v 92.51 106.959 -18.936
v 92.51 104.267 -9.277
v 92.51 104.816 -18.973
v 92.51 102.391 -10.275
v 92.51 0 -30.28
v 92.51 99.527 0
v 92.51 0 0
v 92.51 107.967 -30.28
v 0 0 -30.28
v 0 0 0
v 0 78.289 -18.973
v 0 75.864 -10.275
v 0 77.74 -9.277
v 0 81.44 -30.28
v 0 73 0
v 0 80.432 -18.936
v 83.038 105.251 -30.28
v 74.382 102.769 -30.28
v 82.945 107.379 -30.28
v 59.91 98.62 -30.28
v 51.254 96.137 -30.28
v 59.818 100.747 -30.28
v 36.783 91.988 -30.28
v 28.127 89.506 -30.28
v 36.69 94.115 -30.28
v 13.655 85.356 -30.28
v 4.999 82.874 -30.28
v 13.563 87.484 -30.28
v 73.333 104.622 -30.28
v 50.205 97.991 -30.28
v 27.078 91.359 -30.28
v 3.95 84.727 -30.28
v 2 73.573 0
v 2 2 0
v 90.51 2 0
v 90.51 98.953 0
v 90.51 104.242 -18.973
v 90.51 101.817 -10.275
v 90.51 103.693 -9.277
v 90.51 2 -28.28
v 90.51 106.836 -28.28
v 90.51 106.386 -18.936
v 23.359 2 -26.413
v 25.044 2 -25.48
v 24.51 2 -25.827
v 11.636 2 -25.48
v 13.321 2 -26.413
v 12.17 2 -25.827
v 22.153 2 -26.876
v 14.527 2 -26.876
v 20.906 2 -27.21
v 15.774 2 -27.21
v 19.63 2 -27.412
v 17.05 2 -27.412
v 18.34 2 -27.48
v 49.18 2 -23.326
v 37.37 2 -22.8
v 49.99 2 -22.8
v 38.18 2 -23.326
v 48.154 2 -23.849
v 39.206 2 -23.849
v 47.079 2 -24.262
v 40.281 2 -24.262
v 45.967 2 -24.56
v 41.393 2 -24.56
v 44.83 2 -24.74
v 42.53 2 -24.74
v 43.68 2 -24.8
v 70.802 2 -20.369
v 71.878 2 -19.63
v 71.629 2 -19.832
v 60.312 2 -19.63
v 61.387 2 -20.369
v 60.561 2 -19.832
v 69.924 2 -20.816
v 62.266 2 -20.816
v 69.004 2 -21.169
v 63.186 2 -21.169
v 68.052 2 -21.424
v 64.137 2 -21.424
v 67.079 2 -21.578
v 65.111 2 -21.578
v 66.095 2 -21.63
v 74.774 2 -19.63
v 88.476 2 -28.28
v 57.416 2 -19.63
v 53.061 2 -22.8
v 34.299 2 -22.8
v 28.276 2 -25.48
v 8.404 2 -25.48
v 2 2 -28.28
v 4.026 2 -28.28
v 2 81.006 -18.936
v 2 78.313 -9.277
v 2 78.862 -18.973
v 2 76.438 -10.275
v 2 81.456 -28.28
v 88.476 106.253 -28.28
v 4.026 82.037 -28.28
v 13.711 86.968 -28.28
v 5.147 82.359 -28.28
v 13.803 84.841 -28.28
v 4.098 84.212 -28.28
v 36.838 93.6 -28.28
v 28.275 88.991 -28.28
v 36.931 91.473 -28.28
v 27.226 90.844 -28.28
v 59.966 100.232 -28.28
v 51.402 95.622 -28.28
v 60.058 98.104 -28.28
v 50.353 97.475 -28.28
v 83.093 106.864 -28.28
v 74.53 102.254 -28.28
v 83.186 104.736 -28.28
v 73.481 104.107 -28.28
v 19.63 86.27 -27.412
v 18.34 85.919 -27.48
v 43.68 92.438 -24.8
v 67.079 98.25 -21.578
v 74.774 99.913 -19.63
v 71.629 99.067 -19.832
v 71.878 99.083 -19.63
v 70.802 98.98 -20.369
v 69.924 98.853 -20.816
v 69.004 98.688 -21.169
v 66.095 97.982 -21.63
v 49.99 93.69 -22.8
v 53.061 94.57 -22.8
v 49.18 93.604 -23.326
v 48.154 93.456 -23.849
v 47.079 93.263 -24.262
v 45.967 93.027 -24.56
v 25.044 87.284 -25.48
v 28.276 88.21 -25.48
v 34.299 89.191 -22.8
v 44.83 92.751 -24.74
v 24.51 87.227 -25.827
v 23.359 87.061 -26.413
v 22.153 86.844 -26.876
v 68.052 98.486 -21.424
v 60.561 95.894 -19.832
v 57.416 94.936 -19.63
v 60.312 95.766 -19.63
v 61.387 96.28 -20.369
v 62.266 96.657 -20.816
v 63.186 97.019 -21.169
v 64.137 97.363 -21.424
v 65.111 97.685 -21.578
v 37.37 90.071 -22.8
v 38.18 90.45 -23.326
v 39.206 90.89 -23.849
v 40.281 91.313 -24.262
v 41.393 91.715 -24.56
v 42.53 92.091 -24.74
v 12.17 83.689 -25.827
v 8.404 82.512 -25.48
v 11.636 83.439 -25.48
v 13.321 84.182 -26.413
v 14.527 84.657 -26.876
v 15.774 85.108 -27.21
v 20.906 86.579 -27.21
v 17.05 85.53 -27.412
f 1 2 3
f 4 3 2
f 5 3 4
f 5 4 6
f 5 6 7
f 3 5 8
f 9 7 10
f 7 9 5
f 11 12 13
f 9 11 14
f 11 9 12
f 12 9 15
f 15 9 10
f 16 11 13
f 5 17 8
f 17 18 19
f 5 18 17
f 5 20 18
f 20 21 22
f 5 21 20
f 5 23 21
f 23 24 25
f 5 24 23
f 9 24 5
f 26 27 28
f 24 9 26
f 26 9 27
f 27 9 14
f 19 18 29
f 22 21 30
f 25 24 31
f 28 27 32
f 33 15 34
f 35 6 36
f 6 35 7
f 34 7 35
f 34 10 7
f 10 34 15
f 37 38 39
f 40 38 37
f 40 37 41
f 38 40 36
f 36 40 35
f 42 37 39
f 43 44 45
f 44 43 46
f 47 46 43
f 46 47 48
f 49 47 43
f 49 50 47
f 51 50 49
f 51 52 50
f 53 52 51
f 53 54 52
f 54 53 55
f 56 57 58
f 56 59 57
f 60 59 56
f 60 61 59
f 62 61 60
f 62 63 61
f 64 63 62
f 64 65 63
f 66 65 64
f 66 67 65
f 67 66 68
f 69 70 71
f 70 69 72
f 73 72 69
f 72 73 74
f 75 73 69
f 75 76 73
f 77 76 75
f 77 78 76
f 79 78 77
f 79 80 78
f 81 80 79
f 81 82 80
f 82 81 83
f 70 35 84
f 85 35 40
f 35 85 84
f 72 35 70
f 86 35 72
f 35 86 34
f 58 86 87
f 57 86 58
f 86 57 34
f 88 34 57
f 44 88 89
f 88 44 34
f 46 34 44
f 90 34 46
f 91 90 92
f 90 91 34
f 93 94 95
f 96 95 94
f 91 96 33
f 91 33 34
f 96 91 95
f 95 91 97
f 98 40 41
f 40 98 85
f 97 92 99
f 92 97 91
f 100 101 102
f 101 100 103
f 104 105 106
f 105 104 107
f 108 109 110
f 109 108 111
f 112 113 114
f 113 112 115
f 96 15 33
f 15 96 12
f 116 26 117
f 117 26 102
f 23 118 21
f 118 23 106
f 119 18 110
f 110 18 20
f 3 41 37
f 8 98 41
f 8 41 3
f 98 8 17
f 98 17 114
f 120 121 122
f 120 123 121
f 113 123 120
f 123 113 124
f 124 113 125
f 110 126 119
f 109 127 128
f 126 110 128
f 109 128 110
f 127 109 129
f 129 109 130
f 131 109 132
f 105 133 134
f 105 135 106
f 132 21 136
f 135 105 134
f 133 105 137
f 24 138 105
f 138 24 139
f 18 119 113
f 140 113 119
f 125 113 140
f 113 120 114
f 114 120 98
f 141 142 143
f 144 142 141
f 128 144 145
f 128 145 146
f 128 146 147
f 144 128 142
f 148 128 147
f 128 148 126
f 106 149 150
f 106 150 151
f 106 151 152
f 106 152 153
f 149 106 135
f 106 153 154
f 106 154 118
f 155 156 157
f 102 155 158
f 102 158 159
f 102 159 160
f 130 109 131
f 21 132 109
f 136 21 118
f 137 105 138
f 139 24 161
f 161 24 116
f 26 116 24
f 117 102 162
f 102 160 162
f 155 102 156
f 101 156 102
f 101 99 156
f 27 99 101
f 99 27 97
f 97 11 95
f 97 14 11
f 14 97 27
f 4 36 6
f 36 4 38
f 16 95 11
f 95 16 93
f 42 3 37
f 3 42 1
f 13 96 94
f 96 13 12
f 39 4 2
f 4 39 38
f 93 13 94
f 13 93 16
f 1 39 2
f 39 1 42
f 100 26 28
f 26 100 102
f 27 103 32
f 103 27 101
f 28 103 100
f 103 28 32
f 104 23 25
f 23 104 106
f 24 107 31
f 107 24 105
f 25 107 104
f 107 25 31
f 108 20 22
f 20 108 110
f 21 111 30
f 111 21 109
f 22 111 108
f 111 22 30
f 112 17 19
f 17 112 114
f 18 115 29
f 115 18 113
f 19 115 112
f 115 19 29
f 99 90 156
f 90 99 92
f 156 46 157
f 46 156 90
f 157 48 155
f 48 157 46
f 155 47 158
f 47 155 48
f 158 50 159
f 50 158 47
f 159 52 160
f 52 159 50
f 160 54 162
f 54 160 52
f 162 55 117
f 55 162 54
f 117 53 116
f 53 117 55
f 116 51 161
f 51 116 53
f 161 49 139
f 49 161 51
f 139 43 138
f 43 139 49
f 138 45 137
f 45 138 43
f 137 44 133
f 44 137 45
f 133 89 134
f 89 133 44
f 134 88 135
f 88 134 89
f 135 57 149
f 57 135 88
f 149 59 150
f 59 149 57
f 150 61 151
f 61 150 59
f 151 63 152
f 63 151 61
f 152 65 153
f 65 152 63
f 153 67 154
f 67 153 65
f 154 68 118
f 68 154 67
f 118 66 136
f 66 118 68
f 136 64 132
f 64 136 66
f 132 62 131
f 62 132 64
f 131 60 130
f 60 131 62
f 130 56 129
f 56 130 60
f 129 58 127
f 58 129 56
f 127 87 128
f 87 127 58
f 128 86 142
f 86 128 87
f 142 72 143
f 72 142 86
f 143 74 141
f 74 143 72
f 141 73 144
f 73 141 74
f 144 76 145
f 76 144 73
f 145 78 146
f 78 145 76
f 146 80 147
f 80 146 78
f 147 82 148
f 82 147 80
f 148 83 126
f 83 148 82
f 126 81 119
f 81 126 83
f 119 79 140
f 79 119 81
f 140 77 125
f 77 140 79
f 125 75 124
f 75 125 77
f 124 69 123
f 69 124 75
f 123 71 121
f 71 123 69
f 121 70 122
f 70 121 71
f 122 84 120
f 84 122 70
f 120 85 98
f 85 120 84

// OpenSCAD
/* [General] */

// Choose a currency you use.
currency = "other"; // [usd:USD - US dollar, eur:EUR - Euro, chf:CHF - Swiss franc, cad:CAD - Canadian dollar, thb:THB - Thai Baht, other:Other (See "Slot customization" tab above)]

// How tall is the the shortest tube? In millimeters:
height = 73; // [10:150]

// Choose a pattern for the back side.
pattern = "no"; // [no:Solid without pattern, chncoin:Chinese ancient coin pattern, mesh:Mesh pattern]

// Would you like Tom-and-Jerry pictures on the left side and right side? (Not fully supported; may only work with OpenSCAD version 2014.09 ~ 2014.12.)
image = 0; //// [1:Yes please, 0:No thanks]

// Which one would you like to see?
part = "basebox"; // [all:All these three parts assembled together,all_unassembled:All these three parts unassembled,basebox:Base box only,topboard:Top board only,tubes:Tubes only]

/* [Slot customization] */

// In this tab you're able to customize your coins. Here below, you may have up to 10 slots, each for one kind of coin. For each slot you're going to define it's diameter and thickness. Note that the coins should be ordered from biggest to smallest in diameter. You may want to collect information about the diameters and thicknesses of your coins from wikipedia before you continue.
understand = 1; // [1:Yes I understand,0:Yes I said understand]

// in millimeters. For the first (and biggest) coin.
coin_1_diameter = 23.88;
// in millimeters.
coin_1_thickness = 1.58;
// The second coin. Remember: this 2nd coin should always be smaller than the 1st coin.
coin_2_diameter = 21.20;
coin_2_thickness = 1.76;
// The 3rd coin.
coin_3_diameter = 18.03;
coin_3_thickness = 1.22;
// 4th coin.
coin_4_diameter = 0;
coin_4_thickness = 0;
// 5th coin. If you don't need more coins, simply set the remaining to 0.
coin_5_diameter = 0;
coin_5_thickness = 0;
// 6th coin.
coin_6_diameter = 0;
coin_6_thickness = 0;
// 7th coin.
coin_7_diameter = 0;
coin_7_thickness = 0;
// 8th coin.
coin_8_diameter = 0;
coin_8_thickness = 0;
// 9th coin.
coin_9_diameter = 0;
coin_9_thickness = 0;
// 10th coin.
coin_10_diameter = 0;
coin_10_thickness = 0;

/* [Hidden] */

usd_coins = [[30.61, 26.50, 24.26, 21.21, 19.05, 17.91],
             [ 2.15,  2.00,  1.75,  1.95,  1.55,  1.35]];
eur_coins = [[25.75, 24.25, 23.25, 22.25, 21.25, 19.75, 18.75, 16.25],
             [ 2.20,  2.38,  2.33,  2.14,  1.67,  1.93,  1.67,  1.67]];
chf_coins = [[31.45, 27.40, 23.20, 21.05, 19.15, 18.20, 17.15],
             [ 2.35,  2.15,  1.15,  1.65,  1.45,  1.25,  1.25]];
cad_coins = [[28.00, 27.13, 26.50, 23.88, 21.20, 19.05, 18.03],
             [ 1.80,  1.95,  1.75,  1.58,  1.76,  1.45,  1.22]];
thb_coins = [[26.00, 24.05, 22.05, 20.01],
             [ 2.16,  2.13,  1.48,  1.38]];

other_coins_d_t = [
  [coin_1_diameter, coin_1_thickness], [coin_2_diameter, coin_2_thickness],
  [coin_3_diameter, coin_3_thickness], [coin_4_diameter, coin_4_thickness],
  [coin_5_diameter, coin_5_thickness], [coin_6_diameter, coin_6_thickness],
  [coin_7_diameter, coin_7_thickness], [coin_8_diameter, coin_8_thickness],
  [coin_9_diameter, coin_9_thickness], [coin_10_diameter, coin_10_thickness]];

other_coins = [[for (i=other_coins_d_t) if(i[0] > 0) i[0]],
               [for (i=other_coins_d_t) if(i[0] > 0) i[1]]];


//  .88b  d88.   .d8b.   d888888b  d8b   db
//  88'YbdP`88  d8' `8b    `88'    888o  88
//  88  88  88  88ooo88     88     88V8o 88
//  88  88  88  88~~~88     88     88 V8o88
//  88  88  88  88   88    .88.    88  V888
//  YP  YP  YP  YP   YP  Y888888P  VP   V8P

coins = currency == "usd" ? usd_coins :
        currency == "eur" ? eur_coins :
        currency == "chf" ? chf_coins :
        currency == "cad" ? cad_coins :
        currency == "thb" ? thb_coins : other_coins;

coins_d = coins[0];
coins_thickness = coins[1];

enable_box = (part == "all" || part == "all_unassembled" || part == "basebox");
  enable_dovetail = true;
  enable_box_emptier = false;
  enable_mesh = (pattern != "no");
  enable_image = (image == 1);
enable_top_board = (part == "all" || part == "all_unassembled" || part == "topboard");
enable_tubes = (part == "all" || part == "all_unassembled" || part == "tubes");
  enable_tube_scale = true;
  enable_tube_emptier = false;
  inspect_tube_inside = false;
assembled = (part != "all_unassembled");
lay_flat = (part != "all" && part != "all_unassembled");

sorter_min_height = height;
board_thickness = 2.0;
board_left_padding = 2;
board_right_padding = 13;
board_primary_slope = 16;
board_secondary_slope = 15;
horizontal_guard_width = 3;
coin_padding = 0.4;
coin_padding_top_board = 0.25;
nozzle_size = 0.4;
nozzle_size_upbound = 0.41;

dovetail_count = 4;
dovetail_back_max_width = 10;
dovetail_back_min_width = 9;
dovetail_side_max_width = 10;
dovetail_side_min_width = 9;
dovetail_femail_margin = 0.5;

image_left_size = 25;
image_right_size = 30;
image_dir = "";

tubes_shorter = 5;
tubes_front_back_cut = 2;
tubes_base_thickness = 4.0;
tubes_back_thinner = 1;
tubes_scale_depth = 0.4;
tubes_scale_height = 0.8;

unassembled_top_board_lift = 25;
unassembled_tubes_lift = 20;

$fa = 6;  // default: 12
$fs = 1;  // default: 2

coin_count = len(coins_d);
coin_max_index = coin_count - 1;

board_length = (board_left_padding + board_right_padding
                + sum_coins_d()
                + coin_padding * coin_count * 2
                + board_thickness * (coin_count + 3));

board_width = coins_d[0] + coin_padding + board_thickness * 3;

slope_height = tan(board_secondary_slope) * board_width
               + tan(board_primary_slope) * board_length;

sorter_max_height = sorter_min_height + slope_height + board_thickness;
echo("board_length:", board_length);
echo("board_width:", board_width);
echo("sorter_min_height:", sorter_min_height);
echo("sorter_max_height:", sorter_max_height);

main();

module main() {
  top_board_lift = assembled ? 0 : unassembled_top_board_lift;
  tubes_lift = assembled ? 0 : unassembled_tubes_lift;
  if (lay_flat) {
    main_impl_flat(top_board_lift, tubes_lift);
  } else {
    main_impl(top_board_lift, tubes_lift);
  }
}
module main_impl(top_board_lift=0, tubes_lift=0) {
  if (enable_box) {
    base_box();
  }
  if (enable_top_board) {
    translate([0, 0, top_board_lift]) top_board();
  }
  if (enable_tubes) {
    translate([0, 0, tubes_lift]) tubes();
  }
}
module main_impl_flat(top_board_lift=0, tubes_lift=0) {
  if (enable_box) {
    rotate([-90, 0, 0]) base_box();
  }
  if (enable_top_board) {
    translate([0, 0, top_board_lift])
    untransform_top_board(sorter_min_height)
    top_board();
  }
  if (enable_tubes) {
    translate([0, 0, tubes_lift]) tubes();
  }
}


//  d8888b.  .d8b.  .d8888. d88888b      d8888b.  .d88b.  db    db
//  88  `8D d8' `8b 88'  YP 88'          88  `8D .8P  Y8. `8b  d8'
//  88oooY' 88ooo88 `8bo.   88ooooo      88oooY' 88    88  `8bd8'
//  88~~~b. 88~~~88   `Y8b. 88~~~~~      88~~~b. 88    88  .dPYb.
//  88   8D 88   88 db   8D 88.          88   8D `8b  d8' .8P  Y8.
//  Y8888P' YP   YP `8888Y' Y88888P      Y8888P'  `Y88P'  YP    YP

// Component: the box.
module base_box() {
  render(convexity=2)
  difference() {
    union() {
      box_empty();
    }
    if (enable_image) {
      image_left_subtraction();
      image_right_subtraction();
    }
    if (enable_mesh) {
      board_back_hollow(board_thickness * 1.5);
    }
    if (enable_box_emptier) {
      board_left_hollow(fatter=board_thickness * 1.5,
                        thicker=-nozzle_size_upbound * 2);
      board_right_hollow(fatter=board_thickness * 1.5,
                         thicker=-nozzle_size_upbound * 2);
      board_bottom_hollow(fatter=board_thickness * 2,
                          thicker=-nozzle_size_upbound * 2);
    }
  }

  if (enable_dovetail) {
    base_box_dovetails();
  }

  if (enable_image) {
    image_left();
    image_right();
  }

  if (enable_mesh) {
    intersection() {
      board_back_mesh();
      union() {
        board_back_hollow();
        box_back_fill();
      }
    }
  } else {
    box_back_fill();
  }
}

function box_size(fatter=0, thicker=0, altitude=0, fronter=0, taller=0) =
  [board_length + fatter*2 + thicker*2,
   board_width + fatter*2 + thicker*2 + fronter,
   sorter_max_height + fatter*2 + thicker*2 + taller];

module box_move(fatter=0, thicker=0, altitude=0, fronter=0, taller=0) {
  translate([-fatter-thicker,
             -fatter-thicker-fronter,
             altitude-fatter-thicker]) {
    children();
  }
}

module box_empty() {
  cut_top_side() {
    box_empty_tall();
  }
}
module box_empty_tall(fatter=0, thicker=0, altitude=0) {
  difference() {
    box_outer_solid_tall(fatter, thicker, altitude);
    box_inner_solid_tall(fatter, thicker, altitude);
  }
}
module box_outer_solid_tall(fatter=0, thicker=0, altitude=0,
                            fronter=0, taller=0) {
  box_move(fatter, thicker, altitude, fronter, taller) {
    cube(box_size(fatter, thicker, altitude, fronter, taller));
  }
}
module box_inner_solid_tall(fatter=0, thicker=0, altitude=0) {
  box_outer_solid_tall(
      fatter - board_thickness - thicker, thicker, altitude,
      board_thickness + thicker + 0.1,
      board_thickness + thicker + 0.1);
}

module board_back_hollow(thicker=0) {
  xyz = box_size(fatter = -board_thickness - thicker);
  cut_top_side(altitude = -thicker)
  box_move(fatter = -board_thickness - thicker)
  translate([0, xyz[1] + thicker/2, 0]) {
    cube([xyz[0], board_thickness + thicker, xyz[2]]);
  }
}
module box_back_fill(thicker=0) {
  cut_top_side(altitude = -thicker) {
    box_back_fill_tall();
  }
}
module box_back_fill_tall() {
  linear_extrude(height=sorter_max_height, center=false, convexity=2)
  translate([0, coin_padding*2])
  difference() {
    polygon(tube_cut_back_complete());
    for (i = [0 : coin_max_index]) {
      coin_hole_plain(i);
    }
  }
}

module board_left_hollow(fatter=0, thicker=0) {
  xyz = box_size(fatter = -board_thickness - fatter);
  cut_top_side(altitude = -fatter)
  box_move(fatter = -board_thickness - fatter)
  translate([-board_thickness - fatter - thicker/2, 0, 0]) {
    cube([board_thickness + thicker, xyz[1], xyz[2]]);
  }
}

module board_right_hollow(fatter=0, thicker=0) {
  xyz = box_size(fatter = -board_thickness - fatter);
  cut_top_side(altitude = -fatter)
  box_move(fatter = -board_thickness - fatter)
  translate([xyz[0] + fatter - thicker/2, 0, 0]) {
    cube([board_thickness + thicker, xyz[1], xyz[2]]);
  }
}

module board_bottom_hollow(fatter=0, thicker=0) {
  xyz = box_size(fatter = -board_thickness - fatter);
  box_move(fatter = -board_thickness - fatter)
  translate([0, 0, -board_thickness - fatter - thicker/2]) {
    cube([xyz[0], xyz[1], board_thickness + thicker]);
  }
}

// Transformation: cut the right, left, back and front side.
module cut_sides(fatter=0, thicker=0) {
  intersection() {
    union() {
      children();
    }
    box_outer_solid_tall(fatter, thicker, taller=sorter_max_height);
  }
}

module cut_top_side(fatter=0, thicker=0, altitude=0) {
  difference() {
    union() {
      children();
    }
    top_side(sorter_min_height + fatter + altitude);
  }
}


//  d888888b .88b  d88.  d888b        dD  .88b  d88. d88888b .d8888. db   db
//    `88'   88'YbdP`88 88' Y8b      d8'  88'YbdP`88 88'     88'  YP 88   88
//     88    88  88  88 88          d8'   88  88  88 88ooooo `8bo.   88ooo88
//     88    88  88  88 88  ooo    d8'    88  88  88 88~~~~~   `Y8b. 88~~~88
//    .88.   88  88  88 88. ~8~   d8'     88  88  88 88.     db   8D 88   88
//  Y888888P YP  YP  YP  Y888P   C8'      YP  YP  YP Y88888P `8888Y' YP   YP

module image_left() {
  translate([0, (board_width - image_left_size) / 2,
             sorter_min_height * 0.4 - image_left_size / 2]) {
    translate([1, image_left_size, image_left_size])
    rotate([0, -90, 0])
    rotate([0, 0, -90])
    mirror([0, 1, 0])
    resize([image_left_size, image_left_size, 1]) {
      surface(file = str(image_dir, "TomHead_gray.1.dat"), convexity = 2);
    }

    translate([0, image_left_size-0.1, 0]) {
      cube([1, (board_width - image_left_size) / 2 - board_thickness,
            image_left_size]);
    }
  }
}

module image_left_subtraction() {
  translate([0,
             (board_width - image_left_size) / 2 + 0.01,
             sorter_min_height * 0.4 - image_left_size / 2 + 0.01]) {
    cube([0.99, image_left_size - 0.02, image_left_size - 0.02]);
  }
}

module image_right() {
  translate([board_length - 1,
             (board_width - image_right_size) / 2,
             sorter_max_height * 0.37 - image_right_size / 2]) {
    translate([0, 0, image_right_size])
    rotate([0, 90, 0])
    rotate([0, 0, 90])
    mirror([0, 1, 0])
    resize([image_right_size, image_right_size, 1]) {
      surface(file = str(image_dir, "Jerry_bw.dat"), convexity = 2);
    }

    translate([0, image_right_size-0.1, 0]) {
      cube([1, (board_width - image_right_size) / 2 - board_thickness,
            image_right_size]);
    }
  }
}

module image_right_subtraction() {
  translate([board_length - 0.99,
             (board_width - image_right_size) / 2 + 0.01,
             sorter_max_height * 0.37 - image_right_size / 2 + 0.01]) {
    cube([1, image_right_size - 0.02, image_right_size - 0.02]);
  }
}

module board_back_mesh() {
  diag_len = sqrt(board_length * board_length +
                  sorter_max_height*sorter_max_height);

  if (pattern == "mesh") {
    board_back_mesh_grids(
        nozzle_size_upbound, 15, ceil(diag_len / 15) + 1, 45,
        [board_length / 2, board_width * 0.7, sorter_max_height / 2],
        "y", board_width);

  } else if (pattern == "chncoin") {
    board_back_mesh_ancient_coins(
        nozzle_size_upbound, 18, ceil(diag_len / 18 / 2) + 2,
        [board_length / 2, board_width * 0.7, sorter_max_height / 2],
        "y", board_width);
  }
}

module mesh_extrude(
    center=[0,0,0], normal_direction="z", height=10, convexity=10) {
  translate(center) {
    rotate(normal_direction=="x" ? [0,90,0] :
           normal_direction=="y" ? [-90,0,0] : [0,0,0]) {
      linear_extrude(height, center=true, convexity=convexity) {
        children();
      }
    }
  }
}

module board_back_mesh_grids(
    thickness, gap, count, rotate_angle=0,
    center=[0,0,0], normal_direction="z", height=10) {
  length = (thickness + gap) * (count - 1) + thickness;
  mesh_extrude(center, normal_direction, height, convexity=3)
  rotate([0, 0, rotate_angle])
  translate([-length/2, -length/2]) {
    for (i = [0 : count - 1]) {
      translate([(thickness + gap) * i, 0]) {
        square([thickness, length]);
      }
      translate([0, (thickness + gap) * i]) {
        square([length, thickness]);
      }
    }
  }
}

module board_back_mesh_ancient_coins(
    thickness, radius, count,
    center=[0,0,0], normal_direction="z", height=10) {
  sqrt2 = sqrt(2);
  mesh_extrude(center, normal_direction, height, convexity=3)
  translate([-sqrt2 * radius * (count - 1) / 2,
             -sqrt2 * radius * (count - 1) / 2]) {
    for (i = [0 : count - 1])
    for (j = [0 : count - 1]) {
      translate([sqrt2 * radius * i, sqrt2 * radius * j]) {
        render(convexity=2)
        difference() {
          circle(r=radius + thickness / 2);
          circle(r=radius - thickness / 2);
        }
      }
    }
  }
}


//  d888888b  .d88b.  d8888b.      d8888b.  .d88b.   .d8b.  d8888b. d8888b.
//  `~~88~~' .8P  Y8. 88  `8D      88  `8D .8P  Y8. d8' `8b 88  `8D 88  `8D
//     88    88    88 88oodD'      88oooY' 88    88 88ooo88 88oobY' 88   88
//     88    88    88 88~~~        88~~~b. 88    88 88~~~88 88`8b   88   88
//     88    `8b  d8' 88           88   8D `8b  d8' 88   88 88 `88. 88  .8D
//     YP     `Y88P'  88           Y8888P'  `Y88P'  YP   YP 88   YD Y8888D'

// Component: the solid board on top.
module top_board() {
  difference() {
    // the board itself
    cut_sides() {
      transform_top_board(sorter_min_height) {
        cube([board_length*2, board_width*2, board_thickness]);
      }
    }
    // the femail dovetails
    if (enable_dovetail) {
      top_board_dovetails();
    }

    // holes and cuts
    for (i = [0 : coin_max_index]) {
      coin_hole(i, bigger_r=coin_padding_top_board-coin_padding);
      slope_cut_for_coin(i, bigger_r=coin_padding_top_board-coin_padding);
    }
  }

  vertical_guard();
  horizontal_guard();
}

// Component: the guard on top of the top board.
module vertical_guard() {
  difference() {
    intersection() {
      cube([board_length, board_thickness, sorter_max_height * 2]);
      top_side(sorter_min_height + board_thickness - 0.1);
    }
    top_side(sorter_min_height + board_thickness * 2);
  }
}

// Component: the guard crossing the holes.
module horizontal_guard() {
  // should be similar to top_board()
  cut_sides()
  transform_top_board(sorter_min_height) {
    cube([board_length*2,
          horizontal_guard_width + board_thickness,
          board_thickness]);
  }
}

// Submodule: the upper solid box that is rotated the same as the top board.
module top_side(altitude = 0) {
  // rotate it and raise it
  transform_top_board(altitude) {
    // a big box
    translate([-board_length/2, -board_width/5, 0]) {
      cube([board_length*2, board_width*2, sorter_max_height]);
    }
  }
}

// Transformation: do the rotation.
module transform_top_board(lift_z=0) {
  translate([0, 0, lift_z]) {
    rotate(a=board_secondary_slope, v=[1, 0, tan(board_primary_slope)])
    rotate([0, -board_primary_slope, 0]) {
      children();
    }
  }
}

module untransform_top_board(lift_z=0) {
  rotate([0, board_primary_slope, 0])
  rotate(a=-board_secondary_slope, v=[1, 0, tan(board_primary_slope)]) {
    translate([0, 0, -lift_z]) {
      children();
    }
  }
}


//  d8888b.  .d88b.  db    db d88888b d888888b  .d8b.  d888888b db
//  88  `8D .8P  Y8. 88    88 88'     `~~88~~' d8' `8b   `88'   88
//  88   88 88    88 Y8    8P 88ooooo    88    88ooo88    88    88
//  88   88 88    88 `8b  d8' 88~~~~~    88    88~~~88    88    88
//  88  .8D `8b  d8'  `8bd8'  88.        88    88   88   .88.   88booo.
//  Y8888D'  `Y88P'     YP    Y88888P    YP    YP   YP Y888888P Y88888P

// Component: male dovetails on the base box
module base_box_dovetails() {
  render()
  intersection() {
    all_male_dovetails_too_long();
    box_empty_tall();
  }
}

// Component: female dovetails on the top board
module top_board_dovetails() {
  render()
  intersection() {
    all_female_dovetails_too_long();
    box_empty_tall(thicker=dovetail_femail_margin);
  }
}

// Submodule: a male dovetail.
module my_male_dovetail(
    rotate_x, rotate_y, rotate_z, thickness, max_width, min_width) {
  rotate([rotate_x, rotate_y, rotate_z]) {
    translate([0, -0.01, 0]) {
      male_dovetail(
          max_width=max_width, min_width=min_width,
          depth=board_thickness+0.01, height=thickness,
          cutout_width=0, cutout_depth=0);
    }
  }
}

// Submodule: a female dovetail.
module my_female_dovetail(
    rotate_x, rotate_y, rotate_z, thickness, max_width, min_width) {
  rotate([rotate_x, rotate_y, rotate_z]) {
    translate([0, -0.01, 0]) {
      female_dovetail_negative(
          max_width=max_width, min_width=min_width,
          depth=board_thickness+0.02, height=thickness,
          clearance=dovetail_femail_margin);
    }
  }
}

// Submodule: all the too-long male dovetail on the base box
module all_male_dovetails_too_long() {
  transform_top_board(sorter_min_height) {
    translate([0, board_width / 2, 0]) {
      my_male_dovetail(90, 0, 90, board_length * 2,
                       dovetail_side_max_width, dovetail_side_min_width);
    }
    for (i = [1 : dovetail_count]) {
      translate([
          board_length * (i-0.5) / dovetail_count / cos(board_primary_slope),
          board_width + board_thickness,
          0]) {
        my_male_dovetail(90, 0, 0, board_thickness * 2,
                         dovetail_back_max_width, dovetail_back_min_width);
      }
    }
  }
}

// Submodule: all the too-long female dovetail on the top board
module all_female_dovetails_too_long() {
  transform_top_board(sorter_min_height) {
    translate([0, board_width / 2, 0]) {
      my_female_dovetail(90, 0, 90, board_length * 2,
                         dovetail_side_max_width, dovetail_side_min_width);
    }
    for (i = [1 : dovetail_count]) {
      translate([
          board_length * (i-0.5) / dovetail_count / cos(board_primary_slope),
          board_width + board_thickness * 2,
          0]) {
        my_female_dovetail(90, 0, 0, board_thickness * 4,
                           dovetail_back_max_width, dovetail_back_min_width);
      }
    }
  }
}


//   .o88b.  .d88b.  d888888b d8b   db       .o88b. db    db d888888b
//  d8P  Y8 .8P  Y8.   `88'   888o  88      d8P  Y8 88    88 `~~88~~'
//  8P      88    88    88    88V8o 88      8P      88    88    88
//  8b      88    88    88    88 V8o88      8b      88    88    88
//  Y8b  d8 `8b  d8'   .88.   88  V888      Y8b  d8 88b  d88    88
//   `Y88P'  `Y88P'  Y888888P VP   V8P       `Y88P' ~Y8888P'    YP

// Submodule: the coin holes.
module coin_hole(n, bigger_r=0) {
  translate([coin_center_x(n), coin_center_y(n), board_thickness+0.1]) {
    cylinder(h = sorter_max_height,
             r = coins_d[n] / 2 + coin_padding + bigger_r);
  }
}

// Submodule: the coin holes, in a plain.
module coin_hole_plain(n) {
  translate([coin_center_x(n), coin_center_y(n)]) {
    circle(coins_d[n] / 2 + coin_padding);
  }
}

// Submodule: the solid tube, in a plain.
module coin_hole_plain_thicker(n) {
  translate([coin_center_x(n), coin_center_y(n)]) {
    circle(coins_d[n] / 2 + coin_padding + board_thickness);
  }
}

// Submodule: the slope cuts.
module slope_cut_for_coin(n, bigger_r=0) {
  render(convexity=2) {
    intersection() {
      // the (too big) actual slope cut
      transform_top_board(sorter_min_height) {
        a = board_primary_slope;
        th = board_thickness;
        cut_length = coins_d[n] * 1.5;
        move_x = coin_left_x(n+1) - cut_length;
        cut_length_rotated = cut_length / cos(a);
        move_x_rotated = move_x / cos(a) + th * tan(a) + 1;

        translate([move_x_rotated, 0, 0]) {  // move rightwards
          // make a triangle-box
          rotate([0, -atan(th / cut_length_rotated), 0]) {
            cube([cut_length_rotated * 2, board_width, th * 2]);
          }
        }  // translate, move rightwards
      }  // transform_top_board

      // limiting box
      translate([coin_center_x(n), 1, 0]) {
        cube([coins_d[0],
              coin_top_y(n) - 1 + bigger_r,
              sorter_max_height]);
      }
    }
  }
}

//   .o88b.  .d88b.  d888888b d8b   db      d888888b db    db d8888b. d88888b
//  d8P  Y8 .8P  Y8.   `88'   888o  88      `~~88~~' 88    88 88  `8D 88'
//  8P      88    88    88    88V8o 88         88    88    88 88oooY' 88ooooo
//  8b      88    88    88    88 V8o88         88    88    88 88~~~b. 88~~~~~
//  Y8b  d8 `8b  d8'   .88.   88  V888         88    88b  d88 88   8D 88.
//   `Y88P'  `Y88P'  Y888888P VP   V8P         YP    ~Y8888P' Y8888P' Y88888P

// Component: the tubes.
module tubes() {
  linear_extrude(height=tubes_base_thickness+0.01, center=false, convexity=2) {
    tube_base_2();
  }
  difference() {
    translate([0, 0, tubes_base_thickness]) {

      if (enable_tube_emptier) {
        intersection() {
          tube_body_3();
          tube_stronger();
        }

        if (!inspect_tube_inside) {
          tube_body_4();
          if (enable_tube_scale) {
            intersection() {
              tube_body_3();
              tube_scale_replenishment();
            }
          }
        }

      } else {  // !enable_tube_emptier
        tube_body_3();
      }
    }

    if (enable_tube_scale) {
      translate([0, 0, tubes_base_thickness]) {
        tube_scales();
      }
    }
    translate([0, -1, sorter_min_height - tubes_shorter]) {
      rotate([0, -board_primary_slope, 0]) {
        cube([board_length * 2, board_width * 2, sorter_max_height]);
      }
    }
  }
}

// Submodule: the "last coins" and the tube connecting part.
module tube_base_2() {
  polygon(concat(
      [[tube_cut_x_x(0)[0], tube_front_cut_y()],
       [tube_left_x(), tube_front_y()],
       [tube_left_x()+tubes_back_thinner, tube_back_y()]],
      tube_cut_back_xys(),
      [[tube_right_x()-tubes_back_thinner, tube_back_y()],
       [tube_right_x(), tube_front_y()],
       [tube_cut_x_x(coin_max_index)[1], tube_front_cut_y()]]));
}

// Submodule: the tube connecting part subtracted by coin holes.
module tube_base_3() {
  difference() {
    tube_base_2();
    for (i = [0 : coin_max_index]) {
      coin_hole_plain(i);
    }
  }
}

// Submodule: the empty tube_base_3.
module tube_base_4() {
  difference() {
    tube_base_3();
    offset(delta = -nozzle_size_upbound) {
      tube_base_3();
    }
  }
}

module tube_body_3() {
  linear_extrude(height=sorter_max_height, center=false, convexity=2) {
    tube_base_3();
  }
}

module tube_body_4() {
  linear_extrude(height=sorter_max_height, center=false, convexity=2) {
    tube_base_4();
  }
}

module tube_stronger() {
  for (i = [0 : coin_max_index]) {
    x = coin_center_x(i);
    r = coins_d[i] / 2 + coin_padding;

    translate([x, coin_center_y(i), 0]) {
      cylinder(h = tube_height_at(x) * 0.33,
               r1 = r + board_thickness * 0.7,
               r2 = r + nozzle_size);
    }

    translate([x, coin_center_y(i), tube_height_at(x) * 0.67]) {
      cylinder(h = tube_height_at(x) * 0.4,
               r2 = r + board_thickness * 0.7,
               r1 = r + nozzle_size);
    }
  }

  translate([0, board_width, 0])
  rotate([90, 0, 0]) {
    th = board_thickness;

    linear_extrude(height=board_width, convexity=2) {
      polygon([
          [0, -0.1],
          [0, tube_connection_height(0) * 0.55],
          [coin_left_x(0) - th/2, th],
          [coin_left_x(coin_max_index) - th/2, th],
          [board_length - th*3, th],
          [board_length, tube_connection_height(coin_max_index) * 0.55],
          [board_length, -0.1],
      ]);
    }

    linear_extrude(height=board_width, convexity=2) {
      polygon([
          tube_x_height_at(0, 0.1),
          [0, tube_connection_height(0) * 0.45 - th],
          tube_x_height_at(coin_left_x(0) - th/2, -th),
          tube_x_height_at(coin_left_x(coin_max_index) - th/2, -th),
          tube_x_height_at(board_length - th*3, -th),
          [board_length, tube_connection_height(coin_max_index) * 0.50 - th],
          tube_x_height_at(board_length, 0.1),
      ]);
    }
  }
}

module tube_scales() {
  for (i = [0 : coin_max_index]) {
    render(convexity=2) {
      interval = (coins_thickness[i] > 1.5 ? 1 : 2);
      for (j = [interval : interval : sorter_max_height/coins_thickness[i]]) {
        translate([coin_center_x(i),
                   tube_front_cut_y() - 1,
                   j * coins_thickness[i] - tubes_scale_height / 2]) {
          length_offset = (j%10==0 ? 3 : j%2==0 ? 1 : -0.5);
          cube([tube_cut_half_width(i) + length_offset,
                tubes_scale_depth + 1,
                tubes_scale_height]);
        }
      }
    }
  }
}

module tube_scale_replenishment() {
  for (i = [0 : coin_max_index]) {
    translate([coin_center_x(i), tube_front_cut_y() - 1, 0]) {
      cube([tube_cut_half_width(i) + 3 + nozzle_size,
            tubes_scale_depth + 1 + nozzle_size,
            sorter_max_height]);
    }
  }
}


//  d88888b  db    db  d8b   db   .o88b.  .d8888.
//  88'      88    88  888o  88  d8P  Y8  88'  YP
//  88ooo    88    88  88V8o 88  8P       `8bo.
//  88~~~    88    88  88 V8o88  8b         `Y8b.
//  88       88b  d88  88  V888  Y8b  d8  db   8D
//  YP       ~Y8888P'  VP   V8P   `Y88P'  `8888Y'

// Accumulated coins' diameters.
function sum_coins_d(first_n=coin_count) =
  first_n <= 0 ? 0 :
  coins_d[first_n - 1] + sum_coins_d(first_n - 1);

// Coin positions.
function coin_center_x(n) =
  coin_left_x(n) + coins_d[n] / 2;

function coin_left_x(n) =
  board_left_padding + sum_coins_d(n)
  + coin_padding * (2 * n + 1)
  + board_thickness * (n + 2);

function coin_center_y(n) =
  coins_d[n] / 2 + coin_padding + board_thickness;

function coin_top_y(n) =
  coin_center_y(n) + coins_d[n] / 2 + coin_padding;

function coin_bottom_y(n) =
  coin_center_y(n) - coins_d[n] / 2 - coin_padding;

// Tube cuts.
function tube_left_x() = board_thickness + coin_padding;
function tube_right_x() = board_length - board_thickness - coin_padding;
function tube_front_y() = coin_padding;
function tube_back_y() = board_width - board_thickness - coin_padding;
function tube_front_cut_y() = coin_bottom_y(0) + tubes_front_back_cut;

function tube_cut_half_width(n) =
  sqrt(pow(coins_d[n] / 2 + coin_padding + board_thickness, 2)
       - pow(coins_d[n] / 2 + coin_padding - tubes_front_back_cut, 2));

function tube_cut_x_x(n) =
  [coin_center_x(n) - tube_cut_half_width(n),
   coin_center_x(n) + tube_cut_half_width(n)];

function tube_cut_back_xy_xy(n) =
  [[coin_center_x(n) - tube_cut_half_width(n),
    coin_top_y(n) - tubes_front_back_cut],
   [coin_center_x(n) + tube_cut_half_width(n),
    coin_top_y(n) - tubes_front_back_cut]];

function tube_cut_back_xys(first_n=coin_count) =
  first_n <= 0 ? [] :
  concat(tube_cut_back_xys(first_n - 1),
         tube_cut_back_xy_xy(first_n - 1));

function tube_cut_back_complete() =
  concat([[tube_left_x()+tubes_back_thinner, tube_back_y()]],
         tube_cut_back_xys(),
         [[tube_right_x()-tubes_back_thinner, tube_back_y()]]);

// Tube connections.
function tube_height_at(x) =
  sorter_min_height - tubes_shorter - tubes_base_thickness
  + x * tan(board_primary_slope);

function tube_x_height_at(x, z_delta=0) =
  [x, tube_height_at(x) + z_delta];

function tube_connection_height(n) =
  sorter_min_height - tubes_shorter - tubes_base_thickness + (
    n == 0 ? 0:
    coin_center_x(n-1) * tan(board_primary_slope));


// From: https://github.com/hugokernel/OpenSCAD_Dovetail.git
//
//  d8888b.  .d88b.  db    db d88888b d888888b  .d8b.  d888888b db
//  88  `8D .8P  Y8. 88    88 88'     `~~88~~' d8' `8b   `88'   88
//  88   88 88    88 Y8    8P 88ooooo    88    88ooo88    88    88
//  88   88 88    88 `8b  d8' 88~~~~~    88    88~~~88    88    88
//  88  .8D `8b  d8'  `8bd8'  88.        88    88   88   .88.   88booo.
//  Y8888D'  `Y88P'     YP    Y88888P    YP    YP   YP Y888888P Y88888P

module female_dovetail_negative(max_width=11, min_width=5, depth=5, height=30, clearance=0.25) {
  union() {
    translate([0,-0.001,-0.05])
      dovetail_3d(max_width+clearance,min_width+clearance,depth,height+0.1);
      translate([-(max_width+clearance)/2, depth-0.002,-0.5])
        cube([max_width+clearance,clearance/2,height+1]);
  }
}

module female_dovetail(max_width=11, min_width=5, depth=5, height=30, block_width=15, block_depth=9, clearance=0.25) {
    difference() {
      translate([-block_width/2,0,0]) cube([block_width, block_depth, height]);
      female_dovetail_negative(max_width, min_width, depth, height, clearance);
    }
}

module male_dovetail(max_width=11, min_width=5, depth=5, height=30, cutout_width=5, cutout_depth=3.5) {
  difference() {
    dovetail_3d(max_width,min_width,depth,height);
    translate([0.001,depth+0.001,-0.05])
      dovetail_cutout(cutout_width, cutout_depth, height+0.1);
  }
}

module dovetail_3d(max_width=11, min_width=5, depth=5, height=30) {
  linear_extrude(height=height, convexity=2)
    dovetail_2d(max_width,min_width,depth);
}

module dovetail_2d(max_width=11, min_width=5, depth=5) {
  angle=atan((max_width/2-min_width/2)/depth);
  //echo("angle: ", angle);
  polygon(paths=[[0,1,2,3]], points=[[-min_width/2,0], [-max_width/2,depth], [max_width/2, depth], [min_width/2,0]]);
}

module dovetail_cutout(width=5, depth=4, height=30) {
  translate([0,-depth+width/2,0])
    union() {
      translate([-width/2,0,0])
        cube([width,depth-width/2,height]);
      difference() {
        cylinder(r=width/2, h=height, $fs=0.25);
        translate([-width/2-0.05,0.05,-0.05]) cube([width+0.1,width+0.1,height+0.1]);
      }
    }
}

// http://patorjk.com/software/taag/#p=display&c=c%2B%2B&f=Basic&t=abc
